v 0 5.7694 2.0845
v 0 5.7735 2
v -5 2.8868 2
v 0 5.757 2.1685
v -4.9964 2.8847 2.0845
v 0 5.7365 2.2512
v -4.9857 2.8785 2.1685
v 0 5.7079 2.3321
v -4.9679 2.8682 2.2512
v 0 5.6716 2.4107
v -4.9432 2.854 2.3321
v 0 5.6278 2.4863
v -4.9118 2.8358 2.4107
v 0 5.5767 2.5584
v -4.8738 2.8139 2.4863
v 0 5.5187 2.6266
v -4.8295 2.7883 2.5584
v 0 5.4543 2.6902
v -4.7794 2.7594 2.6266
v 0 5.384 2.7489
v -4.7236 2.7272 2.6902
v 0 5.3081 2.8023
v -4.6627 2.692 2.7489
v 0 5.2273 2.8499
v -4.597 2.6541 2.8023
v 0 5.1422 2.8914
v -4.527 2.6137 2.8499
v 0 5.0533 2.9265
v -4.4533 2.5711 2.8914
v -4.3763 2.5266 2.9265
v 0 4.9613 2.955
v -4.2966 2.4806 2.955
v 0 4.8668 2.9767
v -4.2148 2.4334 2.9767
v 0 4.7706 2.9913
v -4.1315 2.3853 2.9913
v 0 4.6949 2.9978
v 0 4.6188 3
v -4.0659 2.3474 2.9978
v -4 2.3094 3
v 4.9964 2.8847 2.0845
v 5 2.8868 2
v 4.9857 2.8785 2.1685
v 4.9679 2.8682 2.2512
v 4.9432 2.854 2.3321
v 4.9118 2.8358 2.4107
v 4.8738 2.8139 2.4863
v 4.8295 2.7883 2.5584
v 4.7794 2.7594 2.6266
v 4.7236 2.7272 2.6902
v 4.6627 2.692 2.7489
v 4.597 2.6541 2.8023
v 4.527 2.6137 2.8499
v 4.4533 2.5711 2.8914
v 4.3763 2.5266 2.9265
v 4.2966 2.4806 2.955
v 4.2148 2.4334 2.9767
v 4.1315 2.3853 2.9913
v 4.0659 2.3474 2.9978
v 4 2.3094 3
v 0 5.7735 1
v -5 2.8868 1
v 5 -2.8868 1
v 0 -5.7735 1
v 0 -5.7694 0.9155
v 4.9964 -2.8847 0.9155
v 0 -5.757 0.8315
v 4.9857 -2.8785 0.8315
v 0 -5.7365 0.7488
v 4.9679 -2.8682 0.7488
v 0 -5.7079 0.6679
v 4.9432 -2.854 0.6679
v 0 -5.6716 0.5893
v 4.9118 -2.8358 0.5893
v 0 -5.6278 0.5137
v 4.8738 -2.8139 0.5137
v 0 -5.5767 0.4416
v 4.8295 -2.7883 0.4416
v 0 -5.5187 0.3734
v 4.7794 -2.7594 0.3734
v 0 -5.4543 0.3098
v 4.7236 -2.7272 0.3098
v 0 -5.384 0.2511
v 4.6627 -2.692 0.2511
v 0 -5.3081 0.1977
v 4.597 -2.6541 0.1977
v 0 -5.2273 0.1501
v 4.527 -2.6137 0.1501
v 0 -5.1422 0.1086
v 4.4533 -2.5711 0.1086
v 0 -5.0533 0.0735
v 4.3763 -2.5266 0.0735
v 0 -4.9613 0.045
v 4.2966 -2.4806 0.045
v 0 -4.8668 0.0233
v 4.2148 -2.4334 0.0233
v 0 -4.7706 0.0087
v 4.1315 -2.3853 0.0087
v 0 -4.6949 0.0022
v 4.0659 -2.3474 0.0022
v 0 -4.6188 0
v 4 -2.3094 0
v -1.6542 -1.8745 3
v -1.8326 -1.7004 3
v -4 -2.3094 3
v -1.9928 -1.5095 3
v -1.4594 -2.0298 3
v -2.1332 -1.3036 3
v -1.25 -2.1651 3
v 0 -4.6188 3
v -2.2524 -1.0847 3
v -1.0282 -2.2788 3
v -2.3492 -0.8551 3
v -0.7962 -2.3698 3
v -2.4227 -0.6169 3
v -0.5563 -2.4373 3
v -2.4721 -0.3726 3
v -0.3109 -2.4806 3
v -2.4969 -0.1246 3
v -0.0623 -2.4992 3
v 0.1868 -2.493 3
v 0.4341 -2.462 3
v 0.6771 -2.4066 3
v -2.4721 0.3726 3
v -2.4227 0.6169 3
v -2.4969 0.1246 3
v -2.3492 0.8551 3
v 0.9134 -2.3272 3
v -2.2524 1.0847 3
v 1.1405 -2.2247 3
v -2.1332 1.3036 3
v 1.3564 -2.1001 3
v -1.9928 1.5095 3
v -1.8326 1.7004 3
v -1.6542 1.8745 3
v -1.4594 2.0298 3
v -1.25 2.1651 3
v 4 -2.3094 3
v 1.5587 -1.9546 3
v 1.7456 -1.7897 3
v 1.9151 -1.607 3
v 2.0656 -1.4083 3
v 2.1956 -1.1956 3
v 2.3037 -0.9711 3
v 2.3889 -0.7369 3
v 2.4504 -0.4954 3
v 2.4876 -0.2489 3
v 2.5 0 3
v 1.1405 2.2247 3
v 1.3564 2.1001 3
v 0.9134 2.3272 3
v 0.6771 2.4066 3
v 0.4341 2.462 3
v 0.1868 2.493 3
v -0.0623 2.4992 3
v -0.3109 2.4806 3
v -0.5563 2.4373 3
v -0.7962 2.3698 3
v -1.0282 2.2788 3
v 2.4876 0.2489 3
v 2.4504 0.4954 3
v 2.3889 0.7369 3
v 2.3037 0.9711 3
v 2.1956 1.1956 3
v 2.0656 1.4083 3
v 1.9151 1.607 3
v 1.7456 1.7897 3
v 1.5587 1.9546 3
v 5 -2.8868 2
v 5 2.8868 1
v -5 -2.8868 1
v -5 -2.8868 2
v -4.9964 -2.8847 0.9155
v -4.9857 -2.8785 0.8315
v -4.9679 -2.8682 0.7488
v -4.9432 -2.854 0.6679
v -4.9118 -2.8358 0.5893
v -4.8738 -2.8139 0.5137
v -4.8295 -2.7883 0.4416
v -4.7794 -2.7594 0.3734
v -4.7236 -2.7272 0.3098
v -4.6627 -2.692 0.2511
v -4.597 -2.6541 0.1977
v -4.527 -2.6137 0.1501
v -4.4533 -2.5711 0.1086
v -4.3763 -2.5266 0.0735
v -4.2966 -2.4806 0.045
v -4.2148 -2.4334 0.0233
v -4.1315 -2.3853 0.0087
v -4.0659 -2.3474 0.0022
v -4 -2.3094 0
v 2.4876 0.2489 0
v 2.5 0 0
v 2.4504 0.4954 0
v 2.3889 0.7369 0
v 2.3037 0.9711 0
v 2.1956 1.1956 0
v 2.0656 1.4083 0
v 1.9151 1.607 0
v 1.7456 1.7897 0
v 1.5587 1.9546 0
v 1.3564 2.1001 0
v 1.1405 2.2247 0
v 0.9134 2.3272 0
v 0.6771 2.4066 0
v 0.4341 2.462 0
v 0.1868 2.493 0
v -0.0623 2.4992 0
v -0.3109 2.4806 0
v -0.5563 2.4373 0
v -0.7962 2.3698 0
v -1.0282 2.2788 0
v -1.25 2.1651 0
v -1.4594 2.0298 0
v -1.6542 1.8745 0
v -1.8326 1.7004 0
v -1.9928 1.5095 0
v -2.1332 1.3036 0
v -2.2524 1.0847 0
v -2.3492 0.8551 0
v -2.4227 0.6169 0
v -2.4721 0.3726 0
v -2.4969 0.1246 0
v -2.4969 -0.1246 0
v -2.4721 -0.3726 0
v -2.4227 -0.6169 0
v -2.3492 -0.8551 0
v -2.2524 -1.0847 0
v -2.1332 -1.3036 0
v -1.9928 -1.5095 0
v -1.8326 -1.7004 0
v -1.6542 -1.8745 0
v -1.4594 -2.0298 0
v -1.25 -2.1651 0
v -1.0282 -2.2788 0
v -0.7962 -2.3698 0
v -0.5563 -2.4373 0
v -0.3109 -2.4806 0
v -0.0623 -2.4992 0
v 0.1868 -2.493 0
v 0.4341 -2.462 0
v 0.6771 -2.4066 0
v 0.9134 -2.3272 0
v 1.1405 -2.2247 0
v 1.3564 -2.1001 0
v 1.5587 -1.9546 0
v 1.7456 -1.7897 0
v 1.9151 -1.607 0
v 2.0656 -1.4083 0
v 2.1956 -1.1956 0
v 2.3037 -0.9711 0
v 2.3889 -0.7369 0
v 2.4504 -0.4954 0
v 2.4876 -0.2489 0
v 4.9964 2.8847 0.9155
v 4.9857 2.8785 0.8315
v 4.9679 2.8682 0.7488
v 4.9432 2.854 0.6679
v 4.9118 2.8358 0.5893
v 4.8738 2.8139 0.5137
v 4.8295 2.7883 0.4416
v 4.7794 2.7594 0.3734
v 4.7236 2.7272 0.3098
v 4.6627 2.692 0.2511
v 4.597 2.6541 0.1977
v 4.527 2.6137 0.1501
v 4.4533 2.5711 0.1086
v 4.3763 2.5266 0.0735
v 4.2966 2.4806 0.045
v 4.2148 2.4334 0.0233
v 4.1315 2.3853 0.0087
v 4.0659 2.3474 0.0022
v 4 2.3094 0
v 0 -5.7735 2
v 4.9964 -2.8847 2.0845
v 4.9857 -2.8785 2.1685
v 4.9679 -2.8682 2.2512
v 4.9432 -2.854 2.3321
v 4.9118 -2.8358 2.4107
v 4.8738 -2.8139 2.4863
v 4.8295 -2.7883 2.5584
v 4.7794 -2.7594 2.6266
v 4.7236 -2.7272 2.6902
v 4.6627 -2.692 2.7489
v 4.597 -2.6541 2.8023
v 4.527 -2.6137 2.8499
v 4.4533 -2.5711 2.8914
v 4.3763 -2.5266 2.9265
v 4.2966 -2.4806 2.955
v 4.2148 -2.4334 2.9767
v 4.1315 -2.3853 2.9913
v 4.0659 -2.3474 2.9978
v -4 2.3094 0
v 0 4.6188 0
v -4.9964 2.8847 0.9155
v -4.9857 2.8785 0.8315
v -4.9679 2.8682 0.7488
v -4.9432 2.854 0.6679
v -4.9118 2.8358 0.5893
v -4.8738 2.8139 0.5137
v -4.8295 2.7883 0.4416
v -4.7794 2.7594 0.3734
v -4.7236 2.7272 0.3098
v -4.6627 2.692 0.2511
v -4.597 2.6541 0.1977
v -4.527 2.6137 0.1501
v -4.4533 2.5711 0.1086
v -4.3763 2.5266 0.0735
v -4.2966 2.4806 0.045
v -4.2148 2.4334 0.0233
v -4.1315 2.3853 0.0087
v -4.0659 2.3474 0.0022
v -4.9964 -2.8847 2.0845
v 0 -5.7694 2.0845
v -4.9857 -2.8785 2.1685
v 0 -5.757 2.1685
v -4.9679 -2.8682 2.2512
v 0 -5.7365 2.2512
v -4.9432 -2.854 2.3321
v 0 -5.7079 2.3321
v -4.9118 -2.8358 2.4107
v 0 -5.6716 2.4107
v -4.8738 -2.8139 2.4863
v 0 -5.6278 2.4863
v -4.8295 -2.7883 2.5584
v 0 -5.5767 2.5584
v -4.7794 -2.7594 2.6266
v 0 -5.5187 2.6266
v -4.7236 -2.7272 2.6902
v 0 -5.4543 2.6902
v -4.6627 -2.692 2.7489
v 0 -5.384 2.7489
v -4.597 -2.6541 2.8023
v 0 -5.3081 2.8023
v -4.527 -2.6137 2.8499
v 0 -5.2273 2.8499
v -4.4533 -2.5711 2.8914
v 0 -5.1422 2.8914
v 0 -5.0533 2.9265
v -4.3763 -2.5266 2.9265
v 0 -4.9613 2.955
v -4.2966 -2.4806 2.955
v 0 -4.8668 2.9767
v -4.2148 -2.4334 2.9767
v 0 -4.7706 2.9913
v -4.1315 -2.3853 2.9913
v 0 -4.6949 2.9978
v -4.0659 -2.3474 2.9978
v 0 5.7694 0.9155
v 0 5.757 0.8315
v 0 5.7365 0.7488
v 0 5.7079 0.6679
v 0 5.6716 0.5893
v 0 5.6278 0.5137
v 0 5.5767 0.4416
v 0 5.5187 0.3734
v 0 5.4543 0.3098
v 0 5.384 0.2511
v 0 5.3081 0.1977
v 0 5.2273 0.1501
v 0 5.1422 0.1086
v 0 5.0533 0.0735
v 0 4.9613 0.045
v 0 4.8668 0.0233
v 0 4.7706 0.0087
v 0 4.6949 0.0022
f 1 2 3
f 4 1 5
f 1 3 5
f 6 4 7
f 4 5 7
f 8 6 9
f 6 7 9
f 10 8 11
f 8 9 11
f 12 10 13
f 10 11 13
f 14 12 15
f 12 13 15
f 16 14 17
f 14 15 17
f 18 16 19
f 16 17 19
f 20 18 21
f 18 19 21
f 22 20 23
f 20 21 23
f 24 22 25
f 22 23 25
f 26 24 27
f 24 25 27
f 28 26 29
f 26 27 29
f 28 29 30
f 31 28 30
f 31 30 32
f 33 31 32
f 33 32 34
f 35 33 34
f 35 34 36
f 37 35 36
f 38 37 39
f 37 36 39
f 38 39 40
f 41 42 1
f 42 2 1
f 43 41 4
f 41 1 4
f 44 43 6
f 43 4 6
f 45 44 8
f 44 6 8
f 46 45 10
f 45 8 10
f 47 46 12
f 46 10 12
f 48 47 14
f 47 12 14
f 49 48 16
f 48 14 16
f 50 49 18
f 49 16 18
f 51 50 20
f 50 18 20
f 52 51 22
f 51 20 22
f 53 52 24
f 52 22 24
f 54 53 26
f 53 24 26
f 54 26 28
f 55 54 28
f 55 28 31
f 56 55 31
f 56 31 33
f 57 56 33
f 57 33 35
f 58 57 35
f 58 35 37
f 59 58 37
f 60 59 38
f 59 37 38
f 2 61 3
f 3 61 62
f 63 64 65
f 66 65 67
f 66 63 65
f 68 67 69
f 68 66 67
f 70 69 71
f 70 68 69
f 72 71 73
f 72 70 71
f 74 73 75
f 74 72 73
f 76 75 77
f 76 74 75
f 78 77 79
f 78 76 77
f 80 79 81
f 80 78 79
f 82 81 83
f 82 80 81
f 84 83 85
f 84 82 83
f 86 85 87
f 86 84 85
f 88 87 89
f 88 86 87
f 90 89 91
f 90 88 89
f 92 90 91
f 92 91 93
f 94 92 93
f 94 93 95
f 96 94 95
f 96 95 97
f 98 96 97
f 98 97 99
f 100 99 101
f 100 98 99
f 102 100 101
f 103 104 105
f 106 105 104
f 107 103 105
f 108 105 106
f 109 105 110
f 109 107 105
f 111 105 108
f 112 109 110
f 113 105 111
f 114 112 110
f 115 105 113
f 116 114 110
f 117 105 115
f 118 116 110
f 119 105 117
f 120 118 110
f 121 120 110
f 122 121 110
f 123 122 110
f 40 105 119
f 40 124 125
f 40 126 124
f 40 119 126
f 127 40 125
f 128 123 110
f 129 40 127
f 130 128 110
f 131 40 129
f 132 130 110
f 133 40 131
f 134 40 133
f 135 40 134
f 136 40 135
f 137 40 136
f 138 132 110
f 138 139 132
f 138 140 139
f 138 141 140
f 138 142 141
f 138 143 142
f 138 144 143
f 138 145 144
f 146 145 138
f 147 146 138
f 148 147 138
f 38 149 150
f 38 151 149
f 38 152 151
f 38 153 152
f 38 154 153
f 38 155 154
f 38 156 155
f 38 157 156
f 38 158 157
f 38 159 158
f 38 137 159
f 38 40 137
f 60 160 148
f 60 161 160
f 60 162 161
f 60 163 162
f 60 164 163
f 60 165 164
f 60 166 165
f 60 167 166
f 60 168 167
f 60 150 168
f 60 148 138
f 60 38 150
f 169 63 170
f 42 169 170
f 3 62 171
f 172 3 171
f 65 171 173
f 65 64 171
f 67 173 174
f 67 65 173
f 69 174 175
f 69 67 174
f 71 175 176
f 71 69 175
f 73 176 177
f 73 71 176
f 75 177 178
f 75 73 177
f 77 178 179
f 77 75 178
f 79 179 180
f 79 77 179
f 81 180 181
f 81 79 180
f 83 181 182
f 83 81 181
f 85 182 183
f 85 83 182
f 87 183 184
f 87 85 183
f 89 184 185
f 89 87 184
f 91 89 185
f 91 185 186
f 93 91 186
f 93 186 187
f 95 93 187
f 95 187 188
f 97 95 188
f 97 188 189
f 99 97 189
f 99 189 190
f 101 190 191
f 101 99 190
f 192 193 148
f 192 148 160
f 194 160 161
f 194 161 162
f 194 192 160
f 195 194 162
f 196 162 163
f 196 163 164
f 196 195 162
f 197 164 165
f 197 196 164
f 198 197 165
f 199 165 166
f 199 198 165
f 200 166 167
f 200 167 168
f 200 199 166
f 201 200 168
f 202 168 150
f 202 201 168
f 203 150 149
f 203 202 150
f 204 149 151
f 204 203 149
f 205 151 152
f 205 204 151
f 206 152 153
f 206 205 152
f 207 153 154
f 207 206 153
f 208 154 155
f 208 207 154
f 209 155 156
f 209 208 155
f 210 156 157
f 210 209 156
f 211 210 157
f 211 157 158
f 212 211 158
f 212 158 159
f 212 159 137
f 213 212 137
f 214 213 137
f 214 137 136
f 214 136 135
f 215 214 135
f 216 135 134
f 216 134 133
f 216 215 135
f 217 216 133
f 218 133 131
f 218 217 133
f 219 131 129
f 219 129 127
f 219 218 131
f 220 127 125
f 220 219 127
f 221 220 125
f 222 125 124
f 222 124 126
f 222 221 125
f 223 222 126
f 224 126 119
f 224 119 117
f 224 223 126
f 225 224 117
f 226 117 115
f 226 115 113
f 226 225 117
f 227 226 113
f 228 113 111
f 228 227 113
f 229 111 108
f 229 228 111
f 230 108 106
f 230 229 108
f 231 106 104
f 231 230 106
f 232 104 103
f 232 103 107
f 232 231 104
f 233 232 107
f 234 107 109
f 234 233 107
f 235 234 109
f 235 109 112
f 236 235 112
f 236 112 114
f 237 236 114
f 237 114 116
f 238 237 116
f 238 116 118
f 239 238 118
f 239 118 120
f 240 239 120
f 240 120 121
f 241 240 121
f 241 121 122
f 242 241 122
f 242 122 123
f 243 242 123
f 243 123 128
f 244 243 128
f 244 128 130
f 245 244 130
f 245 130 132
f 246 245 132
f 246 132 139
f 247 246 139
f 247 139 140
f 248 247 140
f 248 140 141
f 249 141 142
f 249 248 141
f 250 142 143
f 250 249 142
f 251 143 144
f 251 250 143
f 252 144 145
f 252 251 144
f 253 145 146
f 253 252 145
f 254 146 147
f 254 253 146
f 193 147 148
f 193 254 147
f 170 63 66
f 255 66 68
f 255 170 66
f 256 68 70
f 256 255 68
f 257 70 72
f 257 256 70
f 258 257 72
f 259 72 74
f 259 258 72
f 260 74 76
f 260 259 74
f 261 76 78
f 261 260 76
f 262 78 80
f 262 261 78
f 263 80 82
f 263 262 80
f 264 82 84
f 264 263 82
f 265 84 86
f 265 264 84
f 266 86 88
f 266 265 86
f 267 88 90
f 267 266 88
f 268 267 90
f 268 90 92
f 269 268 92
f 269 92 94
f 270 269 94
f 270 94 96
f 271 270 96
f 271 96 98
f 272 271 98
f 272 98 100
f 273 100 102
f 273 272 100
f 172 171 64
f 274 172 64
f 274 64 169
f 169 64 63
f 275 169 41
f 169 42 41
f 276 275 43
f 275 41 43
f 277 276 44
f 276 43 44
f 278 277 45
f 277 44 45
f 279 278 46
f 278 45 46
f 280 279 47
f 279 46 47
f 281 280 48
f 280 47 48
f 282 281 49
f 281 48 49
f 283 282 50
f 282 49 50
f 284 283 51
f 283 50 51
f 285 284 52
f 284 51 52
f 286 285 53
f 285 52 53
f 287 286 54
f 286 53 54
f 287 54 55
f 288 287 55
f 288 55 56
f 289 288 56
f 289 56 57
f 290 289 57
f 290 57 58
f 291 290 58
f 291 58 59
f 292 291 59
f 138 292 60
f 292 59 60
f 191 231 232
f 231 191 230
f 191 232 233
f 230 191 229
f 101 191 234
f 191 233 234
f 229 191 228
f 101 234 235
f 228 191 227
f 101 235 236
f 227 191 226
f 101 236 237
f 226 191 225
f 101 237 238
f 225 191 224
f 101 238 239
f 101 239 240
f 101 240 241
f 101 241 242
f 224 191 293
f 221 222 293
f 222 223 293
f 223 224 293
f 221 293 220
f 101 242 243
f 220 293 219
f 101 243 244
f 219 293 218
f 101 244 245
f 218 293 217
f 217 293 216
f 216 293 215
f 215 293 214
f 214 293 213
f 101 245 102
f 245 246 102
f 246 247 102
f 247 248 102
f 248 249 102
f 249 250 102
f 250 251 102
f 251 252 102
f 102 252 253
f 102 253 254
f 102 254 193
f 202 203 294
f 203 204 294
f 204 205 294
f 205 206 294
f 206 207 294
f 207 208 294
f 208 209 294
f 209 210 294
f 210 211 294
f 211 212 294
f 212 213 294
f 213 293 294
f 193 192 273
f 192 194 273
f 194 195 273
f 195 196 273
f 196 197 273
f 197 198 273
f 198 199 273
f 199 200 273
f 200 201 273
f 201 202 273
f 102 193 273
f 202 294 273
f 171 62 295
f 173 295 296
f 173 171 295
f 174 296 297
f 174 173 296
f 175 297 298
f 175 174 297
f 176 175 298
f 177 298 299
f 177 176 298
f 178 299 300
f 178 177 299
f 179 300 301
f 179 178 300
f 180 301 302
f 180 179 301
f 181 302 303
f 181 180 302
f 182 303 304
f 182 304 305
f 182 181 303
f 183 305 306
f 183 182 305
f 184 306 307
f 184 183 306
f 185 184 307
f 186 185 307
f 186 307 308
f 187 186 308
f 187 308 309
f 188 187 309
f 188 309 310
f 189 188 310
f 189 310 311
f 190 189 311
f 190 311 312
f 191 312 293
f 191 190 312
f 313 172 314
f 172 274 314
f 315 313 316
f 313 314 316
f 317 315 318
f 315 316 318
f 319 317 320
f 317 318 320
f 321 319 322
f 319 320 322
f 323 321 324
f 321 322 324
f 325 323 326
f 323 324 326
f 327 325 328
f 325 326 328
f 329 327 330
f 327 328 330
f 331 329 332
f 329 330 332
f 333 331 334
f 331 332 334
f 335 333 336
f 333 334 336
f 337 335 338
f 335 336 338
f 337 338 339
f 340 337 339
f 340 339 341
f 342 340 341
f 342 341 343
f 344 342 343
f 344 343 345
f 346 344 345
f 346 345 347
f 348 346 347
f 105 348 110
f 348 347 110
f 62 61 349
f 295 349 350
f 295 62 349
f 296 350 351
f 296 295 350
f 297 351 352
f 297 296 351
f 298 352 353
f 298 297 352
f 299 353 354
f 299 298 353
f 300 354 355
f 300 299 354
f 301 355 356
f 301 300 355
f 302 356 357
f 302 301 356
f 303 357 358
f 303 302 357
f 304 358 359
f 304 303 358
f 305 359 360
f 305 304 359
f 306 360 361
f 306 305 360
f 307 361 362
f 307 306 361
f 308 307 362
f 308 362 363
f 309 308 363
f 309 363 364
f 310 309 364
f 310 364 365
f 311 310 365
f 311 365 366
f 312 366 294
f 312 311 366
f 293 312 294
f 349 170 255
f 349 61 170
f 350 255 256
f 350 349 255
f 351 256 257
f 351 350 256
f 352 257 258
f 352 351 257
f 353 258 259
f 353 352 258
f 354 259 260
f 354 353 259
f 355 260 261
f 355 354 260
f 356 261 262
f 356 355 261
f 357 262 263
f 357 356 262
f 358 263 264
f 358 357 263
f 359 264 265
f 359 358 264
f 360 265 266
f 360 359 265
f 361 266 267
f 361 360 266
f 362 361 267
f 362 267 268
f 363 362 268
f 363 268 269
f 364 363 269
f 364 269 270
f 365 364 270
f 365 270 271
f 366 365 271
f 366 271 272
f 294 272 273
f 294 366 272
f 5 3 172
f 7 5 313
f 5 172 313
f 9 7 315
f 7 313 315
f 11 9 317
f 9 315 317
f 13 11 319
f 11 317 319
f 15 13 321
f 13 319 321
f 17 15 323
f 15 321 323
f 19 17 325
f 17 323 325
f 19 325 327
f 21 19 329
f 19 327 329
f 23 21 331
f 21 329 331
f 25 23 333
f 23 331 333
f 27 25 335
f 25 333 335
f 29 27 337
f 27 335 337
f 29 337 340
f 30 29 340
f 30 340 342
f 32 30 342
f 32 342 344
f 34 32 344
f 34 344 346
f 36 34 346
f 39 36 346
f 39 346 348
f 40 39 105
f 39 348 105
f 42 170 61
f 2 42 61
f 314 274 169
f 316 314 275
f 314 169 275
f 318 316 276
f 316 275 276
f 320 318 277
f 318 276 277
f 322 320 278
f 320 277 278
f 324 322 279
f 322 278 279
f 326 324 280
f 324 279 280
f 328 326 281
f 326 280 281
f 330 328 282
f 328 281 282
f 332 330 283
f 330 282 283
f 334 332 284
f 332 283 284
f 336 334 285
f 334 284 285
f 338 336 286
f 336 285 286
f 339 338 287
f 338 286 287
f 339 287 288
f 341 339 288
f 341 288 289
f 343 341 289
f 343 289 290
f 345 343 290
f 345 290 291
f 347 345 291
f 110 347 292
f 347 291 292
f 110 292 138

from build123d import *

# Parameters (mm, degrees)
F0_R     = 2.5
F1_DEPTH = 3
F2_R     = 1


with BuildPart() as f1:
    # F0 (on Top) → F1 (new body)
    with BuildSketch(Plane.XY):
        Polygon((-5, 2.886751), (-5, -2.886751), (0, -5.773503), (5, -2.886751), (5, 2.886751), (0, 5.773503), align=None)
        Circle(F0_R, mode=Mode.SUBTRACT)
    extrude(amount=F1_DEPTH)

    # F2
    f2_edges = [f1.edges().sort_by_distance(p)[0] for p in [
        (5, 0, 0),
        (2.5, 4.330127, 0),
        (-2.5, 4.330127, 0),
        (-5, 0, 0),
        (-2.5, -4.330127, 0),
        (2.5, -4.330127, 0),
        (5, 0, 3),
        (2.5, -4.330127, 3),
        (-2.5, -4.330127, 3),
        (-5, 0, 3),
        (-2.5, 4.330127, 3),
        (2.5, 4.330127, 3),
    ]]
    fillet(f2_edges, radius=F2_R)


solid = f1.part
